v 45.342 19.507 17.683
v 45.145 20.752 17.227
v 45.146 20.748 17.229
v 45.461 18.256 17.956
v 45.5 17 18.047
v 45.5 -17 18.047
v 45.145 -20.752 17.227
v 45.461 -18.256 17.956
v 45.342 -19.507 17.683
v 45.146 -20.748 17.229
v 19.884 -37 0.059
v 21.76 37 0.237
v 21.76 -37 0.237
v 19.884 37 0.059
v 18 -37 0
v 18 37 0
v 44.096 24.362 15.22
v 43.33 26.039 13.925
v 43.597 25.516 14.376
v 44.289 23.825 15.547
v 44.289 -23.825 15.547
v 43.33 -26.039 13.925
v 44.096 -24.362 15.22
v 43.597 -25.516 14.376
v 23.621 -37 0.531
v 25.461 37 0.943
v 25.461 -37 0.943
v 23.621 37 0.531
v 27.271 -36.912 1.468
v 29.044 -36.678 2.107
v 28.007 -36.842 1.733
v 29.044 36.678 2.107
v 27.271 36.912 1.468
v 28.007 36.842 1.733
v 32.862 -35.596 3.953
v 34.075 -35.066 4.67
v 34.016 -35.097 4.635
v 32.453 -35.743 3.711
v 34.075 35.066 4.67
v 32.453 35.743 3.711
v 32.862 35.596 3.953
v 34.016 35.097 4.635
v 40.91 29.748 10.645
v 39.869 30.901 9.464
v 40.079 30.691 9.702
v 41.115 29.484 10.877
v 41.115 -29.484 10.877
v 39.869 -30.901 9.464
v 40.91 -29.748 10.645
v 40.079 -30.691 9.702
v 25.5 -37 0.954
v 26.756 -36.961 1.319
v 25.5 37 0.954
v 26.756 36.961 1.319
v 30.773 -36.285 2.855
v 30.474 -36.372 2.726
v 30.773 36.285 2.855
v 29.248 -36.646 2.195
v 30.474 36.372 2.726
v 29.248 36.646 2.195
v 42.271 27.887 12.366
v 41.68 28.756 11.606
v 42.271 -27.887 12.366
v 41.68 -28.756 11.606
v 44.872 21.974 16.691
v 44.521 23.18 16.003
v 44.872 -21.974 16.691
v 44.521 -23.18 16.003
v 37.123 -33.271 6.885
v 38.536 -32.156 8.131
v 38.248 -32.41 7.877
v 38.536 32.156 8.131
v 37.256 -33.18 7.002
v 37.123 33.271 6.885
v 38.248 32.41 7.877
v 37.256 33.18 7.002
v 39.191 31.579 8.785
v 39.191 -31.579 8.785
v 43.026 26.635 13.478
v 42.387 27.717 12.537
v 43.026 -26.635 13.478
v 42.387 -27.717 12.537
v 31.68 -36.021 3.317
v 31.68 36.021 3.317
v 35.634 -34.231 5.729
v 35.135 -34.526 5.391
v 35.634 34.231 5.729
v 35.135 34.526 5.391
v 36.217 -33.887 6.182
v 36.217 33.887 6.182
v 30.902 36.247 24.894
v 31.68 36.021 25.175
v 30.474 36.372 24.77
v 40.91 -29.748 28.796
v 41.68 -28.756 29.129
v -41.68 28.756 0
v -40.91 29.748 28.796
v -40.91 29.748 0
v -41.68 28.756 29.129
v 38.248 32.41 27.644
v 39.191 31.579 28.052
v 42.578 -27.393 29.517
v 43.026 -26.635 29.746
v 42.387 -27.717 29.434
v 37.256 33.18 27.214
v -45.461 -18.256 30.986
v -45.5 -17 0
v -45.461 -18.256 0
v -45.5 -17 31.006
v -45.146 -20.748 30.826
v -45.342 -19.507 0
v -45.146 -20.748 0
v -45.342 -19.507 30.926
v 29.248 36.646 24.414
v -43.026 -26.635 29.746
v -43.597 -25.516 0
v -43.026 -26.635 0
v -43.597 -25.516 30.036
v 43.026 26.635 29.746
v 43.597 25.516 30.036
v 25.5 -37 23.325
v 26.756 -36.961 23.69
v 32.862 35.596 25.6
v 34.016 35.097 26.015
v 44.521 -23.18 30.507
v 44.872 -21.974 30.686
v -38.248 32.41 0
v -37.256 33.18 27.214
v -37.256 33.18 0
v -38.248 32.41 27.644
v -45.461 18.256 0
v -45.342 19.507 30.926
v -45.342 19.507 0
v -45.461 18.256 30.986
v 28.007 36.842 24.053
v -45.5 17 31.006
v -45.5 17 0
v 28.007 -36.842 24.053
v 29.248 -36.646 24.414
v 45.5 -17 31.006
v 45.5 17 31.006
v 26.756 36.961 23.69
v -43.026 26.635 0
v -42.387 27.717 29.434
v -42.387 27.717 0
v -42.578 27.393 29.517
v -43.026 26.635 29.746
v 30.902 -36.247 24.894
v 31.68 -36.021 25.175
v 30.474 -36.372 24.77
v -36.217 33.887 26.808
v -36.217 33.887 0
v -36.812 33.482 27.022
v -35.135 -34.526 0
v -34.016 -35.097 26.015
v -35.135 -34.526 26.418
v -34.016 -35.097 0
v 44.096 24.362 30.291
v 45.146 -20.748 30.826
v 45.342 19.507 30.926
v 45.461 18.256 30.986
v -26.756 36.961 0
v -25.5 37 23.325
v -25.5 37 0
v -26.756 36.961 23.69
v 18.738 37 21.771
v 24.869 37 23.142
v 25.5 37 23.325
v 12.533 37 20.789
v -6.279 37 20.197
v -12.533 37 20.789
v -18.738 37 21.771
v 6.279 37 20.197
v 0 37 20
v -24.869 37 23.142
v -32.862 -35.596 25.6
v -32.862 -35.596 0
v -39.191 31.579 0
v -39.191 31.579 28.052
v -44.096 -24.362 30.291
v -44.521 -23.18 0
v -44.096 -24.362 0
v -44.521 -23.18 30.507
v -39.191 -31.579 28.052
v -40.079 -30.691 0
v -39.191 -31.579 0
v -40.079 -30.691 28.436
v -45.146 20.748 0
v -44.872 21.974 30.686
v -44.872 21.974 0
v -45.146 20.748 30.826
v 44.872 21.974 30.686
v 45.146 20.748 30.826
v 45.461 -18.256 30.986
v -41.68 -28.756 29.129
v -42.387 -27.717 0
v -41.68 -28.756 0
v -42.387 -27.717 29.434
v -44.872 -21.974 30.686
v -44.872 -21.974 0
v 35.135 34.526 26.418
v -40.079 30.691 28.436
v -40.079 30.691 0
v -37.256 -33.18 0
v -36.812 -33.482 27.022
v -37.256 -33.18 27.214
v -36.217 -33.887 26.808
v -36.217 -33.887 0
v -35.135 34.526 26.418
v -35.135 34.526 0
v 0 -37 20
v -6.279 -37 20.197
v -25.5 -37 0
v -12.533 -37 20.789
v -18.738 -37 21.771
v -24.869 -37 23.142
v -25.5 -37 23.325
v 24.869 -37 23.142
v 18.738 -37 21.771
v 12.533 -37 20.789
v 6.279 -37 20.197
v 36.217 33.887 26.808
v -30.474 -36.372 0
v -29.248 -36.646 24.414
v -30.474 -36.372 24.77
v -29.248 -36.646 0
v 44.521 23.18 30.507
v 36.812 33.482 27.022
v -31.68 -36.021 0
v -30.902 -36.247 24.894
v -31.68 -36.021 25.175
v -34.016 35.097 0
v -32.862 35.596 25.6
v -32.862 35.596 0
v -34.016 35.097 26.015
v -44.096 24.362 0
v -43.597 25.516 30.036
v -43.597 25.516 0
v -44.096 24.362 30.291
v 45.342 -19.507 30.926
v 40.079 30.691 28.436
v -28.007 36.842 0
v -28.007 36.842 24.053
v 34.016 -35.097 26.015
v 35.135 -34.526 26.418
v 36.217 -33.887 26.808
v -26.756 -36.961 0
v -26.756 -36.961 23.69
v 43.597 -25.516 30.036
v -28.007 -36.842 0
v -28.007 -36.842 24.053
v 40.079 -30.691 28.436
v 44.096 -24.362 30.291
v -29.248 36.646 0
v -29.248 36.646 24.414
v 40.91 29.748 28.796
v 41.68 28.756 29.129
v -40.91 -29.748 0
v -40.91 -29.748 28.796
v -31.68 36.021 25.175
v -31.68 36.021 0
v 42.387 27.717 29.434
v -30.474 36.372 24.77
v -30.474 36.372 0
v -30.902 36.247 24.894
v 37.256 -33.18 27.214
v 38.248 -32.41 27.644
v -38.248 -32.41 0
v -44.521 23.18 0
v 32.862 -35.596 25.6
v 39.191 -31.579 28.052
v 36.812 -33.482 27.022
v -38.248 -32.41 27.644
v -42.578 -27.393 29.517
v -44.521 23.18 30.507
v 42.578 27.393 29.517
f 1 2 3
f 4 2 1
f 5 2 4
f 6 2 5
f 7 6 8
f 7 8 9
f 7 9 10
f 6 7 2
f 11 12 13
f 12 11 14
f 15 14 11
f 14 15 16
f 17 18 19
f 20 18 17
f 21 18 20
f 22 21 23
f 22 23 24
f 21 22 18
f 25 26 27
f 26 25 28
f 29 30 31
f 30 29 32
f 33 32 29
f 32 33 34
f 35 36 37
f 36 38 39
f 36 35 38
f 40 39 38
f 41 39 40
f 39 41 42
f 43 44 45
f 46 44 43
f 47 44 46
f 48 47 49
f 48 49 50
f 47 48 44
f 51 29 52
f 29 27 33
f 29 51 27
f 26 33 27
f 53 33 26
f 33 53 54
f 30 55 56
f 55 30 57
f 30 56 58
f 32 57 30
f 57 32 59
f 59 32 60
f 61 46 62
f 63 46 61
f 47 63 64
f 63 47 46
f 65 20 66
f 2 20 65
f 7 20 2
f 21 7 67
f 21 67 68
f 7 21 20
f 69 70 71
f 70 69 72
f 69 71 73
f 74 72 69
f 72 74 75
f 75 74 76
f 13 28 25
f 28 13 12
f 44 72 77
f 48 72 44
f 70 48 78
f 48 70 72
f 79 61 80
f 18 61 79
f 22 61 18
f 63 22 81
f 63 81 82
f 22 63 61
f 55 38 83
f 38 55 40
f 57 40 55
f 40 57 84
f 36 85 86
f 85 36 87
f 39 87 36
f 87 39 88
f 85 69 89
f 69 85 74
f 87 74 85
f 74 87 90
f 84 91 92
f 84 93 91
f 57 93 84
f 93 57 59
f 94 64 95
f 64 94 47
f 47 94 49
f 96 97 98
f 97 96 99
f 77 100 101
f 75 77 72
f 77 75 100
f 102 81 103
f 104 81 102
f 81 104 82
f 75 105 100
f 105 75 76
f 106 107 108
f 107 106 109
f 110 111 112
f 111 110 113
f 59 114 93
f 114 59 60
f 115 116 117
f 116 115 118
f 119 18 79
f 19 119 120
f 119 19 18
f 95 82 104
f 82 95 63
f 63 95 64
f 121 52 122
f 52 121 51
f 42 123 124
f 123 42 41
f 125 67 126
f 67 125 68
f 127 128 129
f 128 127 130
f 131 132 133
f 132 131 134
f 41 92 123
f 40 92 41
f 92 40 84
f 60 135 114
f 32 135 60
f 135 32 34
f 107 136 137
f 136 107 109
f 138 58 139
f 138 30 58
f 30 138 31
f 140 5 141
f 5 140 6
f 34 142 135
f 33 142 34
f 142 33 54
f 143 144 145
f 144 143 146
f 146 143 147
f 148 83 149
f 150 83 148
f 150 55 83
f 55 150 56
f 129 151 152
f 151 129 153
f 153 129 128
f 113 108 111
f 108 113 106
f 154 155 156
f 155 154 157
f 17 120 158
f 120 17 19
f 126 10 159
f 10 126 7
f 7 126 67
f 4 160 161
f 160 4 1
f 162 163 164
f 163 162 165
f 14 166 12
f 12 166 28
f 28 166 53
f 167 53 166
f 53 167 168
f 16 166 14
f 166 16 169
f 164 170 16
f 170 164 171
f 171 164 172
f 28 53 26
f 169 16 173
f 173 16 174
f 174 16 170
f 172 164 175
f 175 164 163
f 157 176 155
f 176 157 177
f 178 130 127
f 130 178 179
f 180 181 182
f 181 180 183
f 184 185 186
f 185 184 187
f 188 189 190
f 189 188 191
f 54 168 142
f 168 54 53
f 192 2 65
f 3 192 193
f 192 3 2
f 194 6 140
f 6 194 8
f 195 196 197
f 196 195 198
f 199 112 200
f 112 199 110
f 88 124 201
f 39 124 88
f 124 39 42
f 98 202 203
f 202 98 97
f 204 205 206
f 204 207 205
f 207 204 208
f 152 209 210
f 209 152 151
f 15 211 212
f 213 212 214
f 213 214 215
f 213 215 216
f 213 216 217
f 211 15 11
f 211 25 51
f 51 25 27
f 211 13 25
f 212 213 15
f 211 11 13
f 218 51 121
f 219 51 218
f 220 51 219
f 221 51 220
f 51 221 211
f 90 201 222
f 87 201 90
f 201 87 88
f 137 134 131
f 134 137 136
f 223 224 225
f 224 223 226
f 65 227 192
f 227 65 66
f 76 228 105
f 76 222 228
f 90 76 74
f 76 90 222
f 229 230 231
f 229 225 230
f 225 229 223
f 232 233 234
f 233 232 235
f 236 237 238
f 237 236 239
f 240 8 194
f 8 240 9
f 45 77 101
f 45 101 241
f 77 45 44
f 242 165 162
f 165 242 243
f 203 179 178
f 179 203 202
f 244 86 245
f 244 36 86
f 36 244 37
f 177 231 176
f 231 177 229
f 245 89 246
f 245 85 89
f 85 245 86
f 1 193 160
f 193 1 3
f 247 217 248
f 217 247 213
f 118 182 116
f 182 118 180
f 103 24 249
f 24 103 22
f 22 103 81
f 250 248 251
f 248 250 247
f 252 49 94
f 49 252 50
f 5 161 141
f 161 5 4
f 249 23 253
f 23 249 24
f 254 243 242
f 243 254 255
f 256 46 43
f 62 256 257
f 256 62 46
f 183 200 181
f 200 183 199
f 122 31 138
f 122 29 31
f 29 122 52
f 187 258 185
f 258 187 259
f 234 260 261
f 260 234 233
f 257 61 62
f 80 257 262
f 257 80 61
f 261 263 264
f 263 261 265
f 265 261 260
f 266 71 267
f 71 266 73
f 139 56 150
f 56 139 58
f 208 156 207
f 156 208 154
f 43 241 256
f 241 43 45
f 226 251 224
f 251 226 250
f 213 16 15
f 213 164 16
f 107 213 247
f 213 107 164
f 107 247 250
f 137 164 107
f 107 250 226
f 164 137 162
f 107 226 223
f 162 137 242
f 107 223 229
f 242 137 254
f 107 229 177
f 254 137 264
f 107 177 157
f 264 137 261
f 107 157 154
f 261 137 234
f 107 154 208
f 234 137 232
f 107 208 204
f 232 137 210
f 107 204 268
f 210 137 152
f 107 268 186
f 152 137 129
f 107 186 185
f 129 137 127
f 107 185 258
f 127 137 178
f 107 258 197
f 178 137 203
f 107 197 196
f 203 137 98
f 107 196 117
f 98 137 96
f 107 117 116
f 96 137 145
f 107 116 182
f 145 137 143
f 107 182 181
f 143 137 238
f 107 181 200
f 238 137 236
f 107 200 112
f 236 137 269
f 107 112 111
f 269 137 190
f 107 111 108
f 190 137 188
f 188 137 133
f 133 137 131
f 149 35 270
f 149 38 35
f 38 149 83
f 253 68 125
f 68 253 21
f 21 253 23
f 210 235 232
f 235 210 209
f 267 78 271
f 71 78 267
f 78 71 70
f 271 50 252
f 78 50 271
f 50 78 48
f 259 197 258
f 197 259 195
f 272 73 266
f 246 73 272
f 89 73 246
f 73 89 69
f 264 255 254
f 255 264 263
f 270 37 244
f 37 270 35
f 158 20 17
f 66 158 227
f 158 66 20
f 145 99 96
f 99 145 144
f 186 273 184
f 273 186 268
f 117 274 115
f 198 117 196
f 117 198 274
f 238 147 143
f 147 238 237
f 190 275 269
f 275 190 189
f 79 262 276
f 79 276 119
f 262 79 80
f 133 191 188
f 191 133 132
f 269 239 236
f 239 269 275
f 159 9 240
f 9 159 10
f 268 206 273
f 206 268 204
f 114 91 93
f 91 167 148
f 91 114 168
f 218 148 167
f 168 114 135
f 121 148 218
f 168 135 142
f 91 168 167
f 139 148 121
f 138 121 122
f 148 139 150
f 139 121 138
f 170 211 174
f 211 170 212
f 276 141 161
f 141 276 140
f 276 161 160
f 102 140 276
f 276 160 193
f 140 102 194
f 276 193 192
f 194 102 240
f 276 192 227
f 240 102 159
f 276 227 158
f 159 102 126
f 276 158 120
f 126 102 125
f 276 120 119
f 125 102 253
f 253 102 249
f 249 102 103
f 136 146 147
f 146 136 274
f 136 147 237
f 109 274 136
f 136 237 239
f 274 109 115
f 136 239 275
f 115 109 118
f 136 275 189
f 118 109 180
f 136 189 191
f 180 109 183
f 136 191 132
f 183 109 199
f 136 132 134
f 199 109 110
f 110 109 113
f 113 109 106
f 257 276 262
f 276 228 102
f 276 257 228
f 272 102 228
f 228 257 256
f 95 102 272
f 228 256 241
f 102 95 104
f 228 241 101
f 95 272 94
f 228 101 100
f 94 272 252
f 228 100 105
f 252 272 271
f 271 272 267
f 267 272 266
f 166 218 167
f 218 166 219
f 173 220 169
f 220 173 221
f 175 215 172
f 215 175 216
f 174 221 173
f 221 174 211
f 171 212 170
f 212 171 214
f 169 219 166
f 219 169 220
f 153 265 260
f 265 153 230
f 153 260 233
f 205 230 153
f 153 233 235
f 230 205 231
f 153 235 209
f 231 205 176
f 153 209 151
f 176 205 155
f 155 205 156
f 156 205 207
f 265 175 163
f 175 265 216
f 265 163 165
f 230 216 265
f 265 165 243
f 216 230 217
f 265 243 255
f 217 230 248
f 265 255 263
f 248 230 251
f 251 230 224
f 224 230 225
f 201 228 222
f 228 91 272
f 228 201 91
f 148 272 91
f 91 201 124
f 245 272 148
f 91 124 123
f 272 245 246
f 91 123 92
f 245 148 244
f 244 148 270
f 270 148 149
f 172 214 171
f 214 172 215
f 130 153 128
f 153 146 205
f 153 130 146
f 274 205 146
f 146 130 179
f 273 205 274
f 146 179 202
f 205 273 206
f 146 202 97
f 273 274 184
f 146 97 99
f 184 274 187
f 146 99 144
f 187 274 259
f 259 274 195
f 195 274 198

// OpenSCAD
// units in millimeters
$fs = 0.1; // mm per facet in cylinder
$fa = 5; // degrees per facet in cylinder
$fn = 100;

LENGTH = 80-6;
WIDTH = 95 - 4;
CORNER_RADIUS = 20;
RISE = 20;
ANGLE = 90;

module corner() {
    cylinder(r=CORNER_RADIUS, h=RISE+20);
}

module riser() {
    difference() {
        translate([CORNER_RADIUS-WIDTH/2, CORNER_RADIUS-LENGTH/2,0])
        hull() {
            corner();
            translate([0,LENGTH-(2*CORNER_RADIUS),0]) corner();
            translate([WIDTH-(2*CORNER_RADIUS),LENGTH-(2*CORNER_RADIUS),0]) corner();
            translate([WIDTH-(2*CORNER_RADIUS),0,0]) corner();
        }
        
        // arm rest
        translate([0, 0, 100 + RISE])
        rotate([ANGLE,0,0])
        cylinder(r=100, h=200, center=true);
        
        lift();

//        bolt_holes();
//        translate([18,0,0]) bolt_holes();
    }
}


module bolt_holes() {
        BOLT_HOLE = 14;
        translate([-WIDTH/2+18,-LENGTH/2 + 35,0])
        cylinder(d=BOLT_HOLE, h=100);
        translate([-WIDTH/2+18,-LENGTH/2 + 65,0])
        cylinder(d=BOLT_HOLE, h=100);
}

module lift() {
    LIFT_RADIUS = 30;
    translate([18,50,LIFT_RADIUS])
    rotate([90,0,0])
    difference() {
        cylinder(r=100, h=LENGTH*1.2);
        cylinder(r=LIFT_RADIUS, h=LENGTH*1.2);
        translate([-500,0,0]) cube([1000,100,100]);
        translate([-100,-100,0]) cube([100,100,100]);    
    }
}

// use mirror to create right and left hand parts

module left() {
    riser();
}
module right() {
    mirror([1,0,0])
    riser();
}

module export(part) { 
    if (part == 1) left(); 
    if (part == 2) right(); 
}
// to be called from bash script
part = 1; // default part for rendering in editor
export(part);
